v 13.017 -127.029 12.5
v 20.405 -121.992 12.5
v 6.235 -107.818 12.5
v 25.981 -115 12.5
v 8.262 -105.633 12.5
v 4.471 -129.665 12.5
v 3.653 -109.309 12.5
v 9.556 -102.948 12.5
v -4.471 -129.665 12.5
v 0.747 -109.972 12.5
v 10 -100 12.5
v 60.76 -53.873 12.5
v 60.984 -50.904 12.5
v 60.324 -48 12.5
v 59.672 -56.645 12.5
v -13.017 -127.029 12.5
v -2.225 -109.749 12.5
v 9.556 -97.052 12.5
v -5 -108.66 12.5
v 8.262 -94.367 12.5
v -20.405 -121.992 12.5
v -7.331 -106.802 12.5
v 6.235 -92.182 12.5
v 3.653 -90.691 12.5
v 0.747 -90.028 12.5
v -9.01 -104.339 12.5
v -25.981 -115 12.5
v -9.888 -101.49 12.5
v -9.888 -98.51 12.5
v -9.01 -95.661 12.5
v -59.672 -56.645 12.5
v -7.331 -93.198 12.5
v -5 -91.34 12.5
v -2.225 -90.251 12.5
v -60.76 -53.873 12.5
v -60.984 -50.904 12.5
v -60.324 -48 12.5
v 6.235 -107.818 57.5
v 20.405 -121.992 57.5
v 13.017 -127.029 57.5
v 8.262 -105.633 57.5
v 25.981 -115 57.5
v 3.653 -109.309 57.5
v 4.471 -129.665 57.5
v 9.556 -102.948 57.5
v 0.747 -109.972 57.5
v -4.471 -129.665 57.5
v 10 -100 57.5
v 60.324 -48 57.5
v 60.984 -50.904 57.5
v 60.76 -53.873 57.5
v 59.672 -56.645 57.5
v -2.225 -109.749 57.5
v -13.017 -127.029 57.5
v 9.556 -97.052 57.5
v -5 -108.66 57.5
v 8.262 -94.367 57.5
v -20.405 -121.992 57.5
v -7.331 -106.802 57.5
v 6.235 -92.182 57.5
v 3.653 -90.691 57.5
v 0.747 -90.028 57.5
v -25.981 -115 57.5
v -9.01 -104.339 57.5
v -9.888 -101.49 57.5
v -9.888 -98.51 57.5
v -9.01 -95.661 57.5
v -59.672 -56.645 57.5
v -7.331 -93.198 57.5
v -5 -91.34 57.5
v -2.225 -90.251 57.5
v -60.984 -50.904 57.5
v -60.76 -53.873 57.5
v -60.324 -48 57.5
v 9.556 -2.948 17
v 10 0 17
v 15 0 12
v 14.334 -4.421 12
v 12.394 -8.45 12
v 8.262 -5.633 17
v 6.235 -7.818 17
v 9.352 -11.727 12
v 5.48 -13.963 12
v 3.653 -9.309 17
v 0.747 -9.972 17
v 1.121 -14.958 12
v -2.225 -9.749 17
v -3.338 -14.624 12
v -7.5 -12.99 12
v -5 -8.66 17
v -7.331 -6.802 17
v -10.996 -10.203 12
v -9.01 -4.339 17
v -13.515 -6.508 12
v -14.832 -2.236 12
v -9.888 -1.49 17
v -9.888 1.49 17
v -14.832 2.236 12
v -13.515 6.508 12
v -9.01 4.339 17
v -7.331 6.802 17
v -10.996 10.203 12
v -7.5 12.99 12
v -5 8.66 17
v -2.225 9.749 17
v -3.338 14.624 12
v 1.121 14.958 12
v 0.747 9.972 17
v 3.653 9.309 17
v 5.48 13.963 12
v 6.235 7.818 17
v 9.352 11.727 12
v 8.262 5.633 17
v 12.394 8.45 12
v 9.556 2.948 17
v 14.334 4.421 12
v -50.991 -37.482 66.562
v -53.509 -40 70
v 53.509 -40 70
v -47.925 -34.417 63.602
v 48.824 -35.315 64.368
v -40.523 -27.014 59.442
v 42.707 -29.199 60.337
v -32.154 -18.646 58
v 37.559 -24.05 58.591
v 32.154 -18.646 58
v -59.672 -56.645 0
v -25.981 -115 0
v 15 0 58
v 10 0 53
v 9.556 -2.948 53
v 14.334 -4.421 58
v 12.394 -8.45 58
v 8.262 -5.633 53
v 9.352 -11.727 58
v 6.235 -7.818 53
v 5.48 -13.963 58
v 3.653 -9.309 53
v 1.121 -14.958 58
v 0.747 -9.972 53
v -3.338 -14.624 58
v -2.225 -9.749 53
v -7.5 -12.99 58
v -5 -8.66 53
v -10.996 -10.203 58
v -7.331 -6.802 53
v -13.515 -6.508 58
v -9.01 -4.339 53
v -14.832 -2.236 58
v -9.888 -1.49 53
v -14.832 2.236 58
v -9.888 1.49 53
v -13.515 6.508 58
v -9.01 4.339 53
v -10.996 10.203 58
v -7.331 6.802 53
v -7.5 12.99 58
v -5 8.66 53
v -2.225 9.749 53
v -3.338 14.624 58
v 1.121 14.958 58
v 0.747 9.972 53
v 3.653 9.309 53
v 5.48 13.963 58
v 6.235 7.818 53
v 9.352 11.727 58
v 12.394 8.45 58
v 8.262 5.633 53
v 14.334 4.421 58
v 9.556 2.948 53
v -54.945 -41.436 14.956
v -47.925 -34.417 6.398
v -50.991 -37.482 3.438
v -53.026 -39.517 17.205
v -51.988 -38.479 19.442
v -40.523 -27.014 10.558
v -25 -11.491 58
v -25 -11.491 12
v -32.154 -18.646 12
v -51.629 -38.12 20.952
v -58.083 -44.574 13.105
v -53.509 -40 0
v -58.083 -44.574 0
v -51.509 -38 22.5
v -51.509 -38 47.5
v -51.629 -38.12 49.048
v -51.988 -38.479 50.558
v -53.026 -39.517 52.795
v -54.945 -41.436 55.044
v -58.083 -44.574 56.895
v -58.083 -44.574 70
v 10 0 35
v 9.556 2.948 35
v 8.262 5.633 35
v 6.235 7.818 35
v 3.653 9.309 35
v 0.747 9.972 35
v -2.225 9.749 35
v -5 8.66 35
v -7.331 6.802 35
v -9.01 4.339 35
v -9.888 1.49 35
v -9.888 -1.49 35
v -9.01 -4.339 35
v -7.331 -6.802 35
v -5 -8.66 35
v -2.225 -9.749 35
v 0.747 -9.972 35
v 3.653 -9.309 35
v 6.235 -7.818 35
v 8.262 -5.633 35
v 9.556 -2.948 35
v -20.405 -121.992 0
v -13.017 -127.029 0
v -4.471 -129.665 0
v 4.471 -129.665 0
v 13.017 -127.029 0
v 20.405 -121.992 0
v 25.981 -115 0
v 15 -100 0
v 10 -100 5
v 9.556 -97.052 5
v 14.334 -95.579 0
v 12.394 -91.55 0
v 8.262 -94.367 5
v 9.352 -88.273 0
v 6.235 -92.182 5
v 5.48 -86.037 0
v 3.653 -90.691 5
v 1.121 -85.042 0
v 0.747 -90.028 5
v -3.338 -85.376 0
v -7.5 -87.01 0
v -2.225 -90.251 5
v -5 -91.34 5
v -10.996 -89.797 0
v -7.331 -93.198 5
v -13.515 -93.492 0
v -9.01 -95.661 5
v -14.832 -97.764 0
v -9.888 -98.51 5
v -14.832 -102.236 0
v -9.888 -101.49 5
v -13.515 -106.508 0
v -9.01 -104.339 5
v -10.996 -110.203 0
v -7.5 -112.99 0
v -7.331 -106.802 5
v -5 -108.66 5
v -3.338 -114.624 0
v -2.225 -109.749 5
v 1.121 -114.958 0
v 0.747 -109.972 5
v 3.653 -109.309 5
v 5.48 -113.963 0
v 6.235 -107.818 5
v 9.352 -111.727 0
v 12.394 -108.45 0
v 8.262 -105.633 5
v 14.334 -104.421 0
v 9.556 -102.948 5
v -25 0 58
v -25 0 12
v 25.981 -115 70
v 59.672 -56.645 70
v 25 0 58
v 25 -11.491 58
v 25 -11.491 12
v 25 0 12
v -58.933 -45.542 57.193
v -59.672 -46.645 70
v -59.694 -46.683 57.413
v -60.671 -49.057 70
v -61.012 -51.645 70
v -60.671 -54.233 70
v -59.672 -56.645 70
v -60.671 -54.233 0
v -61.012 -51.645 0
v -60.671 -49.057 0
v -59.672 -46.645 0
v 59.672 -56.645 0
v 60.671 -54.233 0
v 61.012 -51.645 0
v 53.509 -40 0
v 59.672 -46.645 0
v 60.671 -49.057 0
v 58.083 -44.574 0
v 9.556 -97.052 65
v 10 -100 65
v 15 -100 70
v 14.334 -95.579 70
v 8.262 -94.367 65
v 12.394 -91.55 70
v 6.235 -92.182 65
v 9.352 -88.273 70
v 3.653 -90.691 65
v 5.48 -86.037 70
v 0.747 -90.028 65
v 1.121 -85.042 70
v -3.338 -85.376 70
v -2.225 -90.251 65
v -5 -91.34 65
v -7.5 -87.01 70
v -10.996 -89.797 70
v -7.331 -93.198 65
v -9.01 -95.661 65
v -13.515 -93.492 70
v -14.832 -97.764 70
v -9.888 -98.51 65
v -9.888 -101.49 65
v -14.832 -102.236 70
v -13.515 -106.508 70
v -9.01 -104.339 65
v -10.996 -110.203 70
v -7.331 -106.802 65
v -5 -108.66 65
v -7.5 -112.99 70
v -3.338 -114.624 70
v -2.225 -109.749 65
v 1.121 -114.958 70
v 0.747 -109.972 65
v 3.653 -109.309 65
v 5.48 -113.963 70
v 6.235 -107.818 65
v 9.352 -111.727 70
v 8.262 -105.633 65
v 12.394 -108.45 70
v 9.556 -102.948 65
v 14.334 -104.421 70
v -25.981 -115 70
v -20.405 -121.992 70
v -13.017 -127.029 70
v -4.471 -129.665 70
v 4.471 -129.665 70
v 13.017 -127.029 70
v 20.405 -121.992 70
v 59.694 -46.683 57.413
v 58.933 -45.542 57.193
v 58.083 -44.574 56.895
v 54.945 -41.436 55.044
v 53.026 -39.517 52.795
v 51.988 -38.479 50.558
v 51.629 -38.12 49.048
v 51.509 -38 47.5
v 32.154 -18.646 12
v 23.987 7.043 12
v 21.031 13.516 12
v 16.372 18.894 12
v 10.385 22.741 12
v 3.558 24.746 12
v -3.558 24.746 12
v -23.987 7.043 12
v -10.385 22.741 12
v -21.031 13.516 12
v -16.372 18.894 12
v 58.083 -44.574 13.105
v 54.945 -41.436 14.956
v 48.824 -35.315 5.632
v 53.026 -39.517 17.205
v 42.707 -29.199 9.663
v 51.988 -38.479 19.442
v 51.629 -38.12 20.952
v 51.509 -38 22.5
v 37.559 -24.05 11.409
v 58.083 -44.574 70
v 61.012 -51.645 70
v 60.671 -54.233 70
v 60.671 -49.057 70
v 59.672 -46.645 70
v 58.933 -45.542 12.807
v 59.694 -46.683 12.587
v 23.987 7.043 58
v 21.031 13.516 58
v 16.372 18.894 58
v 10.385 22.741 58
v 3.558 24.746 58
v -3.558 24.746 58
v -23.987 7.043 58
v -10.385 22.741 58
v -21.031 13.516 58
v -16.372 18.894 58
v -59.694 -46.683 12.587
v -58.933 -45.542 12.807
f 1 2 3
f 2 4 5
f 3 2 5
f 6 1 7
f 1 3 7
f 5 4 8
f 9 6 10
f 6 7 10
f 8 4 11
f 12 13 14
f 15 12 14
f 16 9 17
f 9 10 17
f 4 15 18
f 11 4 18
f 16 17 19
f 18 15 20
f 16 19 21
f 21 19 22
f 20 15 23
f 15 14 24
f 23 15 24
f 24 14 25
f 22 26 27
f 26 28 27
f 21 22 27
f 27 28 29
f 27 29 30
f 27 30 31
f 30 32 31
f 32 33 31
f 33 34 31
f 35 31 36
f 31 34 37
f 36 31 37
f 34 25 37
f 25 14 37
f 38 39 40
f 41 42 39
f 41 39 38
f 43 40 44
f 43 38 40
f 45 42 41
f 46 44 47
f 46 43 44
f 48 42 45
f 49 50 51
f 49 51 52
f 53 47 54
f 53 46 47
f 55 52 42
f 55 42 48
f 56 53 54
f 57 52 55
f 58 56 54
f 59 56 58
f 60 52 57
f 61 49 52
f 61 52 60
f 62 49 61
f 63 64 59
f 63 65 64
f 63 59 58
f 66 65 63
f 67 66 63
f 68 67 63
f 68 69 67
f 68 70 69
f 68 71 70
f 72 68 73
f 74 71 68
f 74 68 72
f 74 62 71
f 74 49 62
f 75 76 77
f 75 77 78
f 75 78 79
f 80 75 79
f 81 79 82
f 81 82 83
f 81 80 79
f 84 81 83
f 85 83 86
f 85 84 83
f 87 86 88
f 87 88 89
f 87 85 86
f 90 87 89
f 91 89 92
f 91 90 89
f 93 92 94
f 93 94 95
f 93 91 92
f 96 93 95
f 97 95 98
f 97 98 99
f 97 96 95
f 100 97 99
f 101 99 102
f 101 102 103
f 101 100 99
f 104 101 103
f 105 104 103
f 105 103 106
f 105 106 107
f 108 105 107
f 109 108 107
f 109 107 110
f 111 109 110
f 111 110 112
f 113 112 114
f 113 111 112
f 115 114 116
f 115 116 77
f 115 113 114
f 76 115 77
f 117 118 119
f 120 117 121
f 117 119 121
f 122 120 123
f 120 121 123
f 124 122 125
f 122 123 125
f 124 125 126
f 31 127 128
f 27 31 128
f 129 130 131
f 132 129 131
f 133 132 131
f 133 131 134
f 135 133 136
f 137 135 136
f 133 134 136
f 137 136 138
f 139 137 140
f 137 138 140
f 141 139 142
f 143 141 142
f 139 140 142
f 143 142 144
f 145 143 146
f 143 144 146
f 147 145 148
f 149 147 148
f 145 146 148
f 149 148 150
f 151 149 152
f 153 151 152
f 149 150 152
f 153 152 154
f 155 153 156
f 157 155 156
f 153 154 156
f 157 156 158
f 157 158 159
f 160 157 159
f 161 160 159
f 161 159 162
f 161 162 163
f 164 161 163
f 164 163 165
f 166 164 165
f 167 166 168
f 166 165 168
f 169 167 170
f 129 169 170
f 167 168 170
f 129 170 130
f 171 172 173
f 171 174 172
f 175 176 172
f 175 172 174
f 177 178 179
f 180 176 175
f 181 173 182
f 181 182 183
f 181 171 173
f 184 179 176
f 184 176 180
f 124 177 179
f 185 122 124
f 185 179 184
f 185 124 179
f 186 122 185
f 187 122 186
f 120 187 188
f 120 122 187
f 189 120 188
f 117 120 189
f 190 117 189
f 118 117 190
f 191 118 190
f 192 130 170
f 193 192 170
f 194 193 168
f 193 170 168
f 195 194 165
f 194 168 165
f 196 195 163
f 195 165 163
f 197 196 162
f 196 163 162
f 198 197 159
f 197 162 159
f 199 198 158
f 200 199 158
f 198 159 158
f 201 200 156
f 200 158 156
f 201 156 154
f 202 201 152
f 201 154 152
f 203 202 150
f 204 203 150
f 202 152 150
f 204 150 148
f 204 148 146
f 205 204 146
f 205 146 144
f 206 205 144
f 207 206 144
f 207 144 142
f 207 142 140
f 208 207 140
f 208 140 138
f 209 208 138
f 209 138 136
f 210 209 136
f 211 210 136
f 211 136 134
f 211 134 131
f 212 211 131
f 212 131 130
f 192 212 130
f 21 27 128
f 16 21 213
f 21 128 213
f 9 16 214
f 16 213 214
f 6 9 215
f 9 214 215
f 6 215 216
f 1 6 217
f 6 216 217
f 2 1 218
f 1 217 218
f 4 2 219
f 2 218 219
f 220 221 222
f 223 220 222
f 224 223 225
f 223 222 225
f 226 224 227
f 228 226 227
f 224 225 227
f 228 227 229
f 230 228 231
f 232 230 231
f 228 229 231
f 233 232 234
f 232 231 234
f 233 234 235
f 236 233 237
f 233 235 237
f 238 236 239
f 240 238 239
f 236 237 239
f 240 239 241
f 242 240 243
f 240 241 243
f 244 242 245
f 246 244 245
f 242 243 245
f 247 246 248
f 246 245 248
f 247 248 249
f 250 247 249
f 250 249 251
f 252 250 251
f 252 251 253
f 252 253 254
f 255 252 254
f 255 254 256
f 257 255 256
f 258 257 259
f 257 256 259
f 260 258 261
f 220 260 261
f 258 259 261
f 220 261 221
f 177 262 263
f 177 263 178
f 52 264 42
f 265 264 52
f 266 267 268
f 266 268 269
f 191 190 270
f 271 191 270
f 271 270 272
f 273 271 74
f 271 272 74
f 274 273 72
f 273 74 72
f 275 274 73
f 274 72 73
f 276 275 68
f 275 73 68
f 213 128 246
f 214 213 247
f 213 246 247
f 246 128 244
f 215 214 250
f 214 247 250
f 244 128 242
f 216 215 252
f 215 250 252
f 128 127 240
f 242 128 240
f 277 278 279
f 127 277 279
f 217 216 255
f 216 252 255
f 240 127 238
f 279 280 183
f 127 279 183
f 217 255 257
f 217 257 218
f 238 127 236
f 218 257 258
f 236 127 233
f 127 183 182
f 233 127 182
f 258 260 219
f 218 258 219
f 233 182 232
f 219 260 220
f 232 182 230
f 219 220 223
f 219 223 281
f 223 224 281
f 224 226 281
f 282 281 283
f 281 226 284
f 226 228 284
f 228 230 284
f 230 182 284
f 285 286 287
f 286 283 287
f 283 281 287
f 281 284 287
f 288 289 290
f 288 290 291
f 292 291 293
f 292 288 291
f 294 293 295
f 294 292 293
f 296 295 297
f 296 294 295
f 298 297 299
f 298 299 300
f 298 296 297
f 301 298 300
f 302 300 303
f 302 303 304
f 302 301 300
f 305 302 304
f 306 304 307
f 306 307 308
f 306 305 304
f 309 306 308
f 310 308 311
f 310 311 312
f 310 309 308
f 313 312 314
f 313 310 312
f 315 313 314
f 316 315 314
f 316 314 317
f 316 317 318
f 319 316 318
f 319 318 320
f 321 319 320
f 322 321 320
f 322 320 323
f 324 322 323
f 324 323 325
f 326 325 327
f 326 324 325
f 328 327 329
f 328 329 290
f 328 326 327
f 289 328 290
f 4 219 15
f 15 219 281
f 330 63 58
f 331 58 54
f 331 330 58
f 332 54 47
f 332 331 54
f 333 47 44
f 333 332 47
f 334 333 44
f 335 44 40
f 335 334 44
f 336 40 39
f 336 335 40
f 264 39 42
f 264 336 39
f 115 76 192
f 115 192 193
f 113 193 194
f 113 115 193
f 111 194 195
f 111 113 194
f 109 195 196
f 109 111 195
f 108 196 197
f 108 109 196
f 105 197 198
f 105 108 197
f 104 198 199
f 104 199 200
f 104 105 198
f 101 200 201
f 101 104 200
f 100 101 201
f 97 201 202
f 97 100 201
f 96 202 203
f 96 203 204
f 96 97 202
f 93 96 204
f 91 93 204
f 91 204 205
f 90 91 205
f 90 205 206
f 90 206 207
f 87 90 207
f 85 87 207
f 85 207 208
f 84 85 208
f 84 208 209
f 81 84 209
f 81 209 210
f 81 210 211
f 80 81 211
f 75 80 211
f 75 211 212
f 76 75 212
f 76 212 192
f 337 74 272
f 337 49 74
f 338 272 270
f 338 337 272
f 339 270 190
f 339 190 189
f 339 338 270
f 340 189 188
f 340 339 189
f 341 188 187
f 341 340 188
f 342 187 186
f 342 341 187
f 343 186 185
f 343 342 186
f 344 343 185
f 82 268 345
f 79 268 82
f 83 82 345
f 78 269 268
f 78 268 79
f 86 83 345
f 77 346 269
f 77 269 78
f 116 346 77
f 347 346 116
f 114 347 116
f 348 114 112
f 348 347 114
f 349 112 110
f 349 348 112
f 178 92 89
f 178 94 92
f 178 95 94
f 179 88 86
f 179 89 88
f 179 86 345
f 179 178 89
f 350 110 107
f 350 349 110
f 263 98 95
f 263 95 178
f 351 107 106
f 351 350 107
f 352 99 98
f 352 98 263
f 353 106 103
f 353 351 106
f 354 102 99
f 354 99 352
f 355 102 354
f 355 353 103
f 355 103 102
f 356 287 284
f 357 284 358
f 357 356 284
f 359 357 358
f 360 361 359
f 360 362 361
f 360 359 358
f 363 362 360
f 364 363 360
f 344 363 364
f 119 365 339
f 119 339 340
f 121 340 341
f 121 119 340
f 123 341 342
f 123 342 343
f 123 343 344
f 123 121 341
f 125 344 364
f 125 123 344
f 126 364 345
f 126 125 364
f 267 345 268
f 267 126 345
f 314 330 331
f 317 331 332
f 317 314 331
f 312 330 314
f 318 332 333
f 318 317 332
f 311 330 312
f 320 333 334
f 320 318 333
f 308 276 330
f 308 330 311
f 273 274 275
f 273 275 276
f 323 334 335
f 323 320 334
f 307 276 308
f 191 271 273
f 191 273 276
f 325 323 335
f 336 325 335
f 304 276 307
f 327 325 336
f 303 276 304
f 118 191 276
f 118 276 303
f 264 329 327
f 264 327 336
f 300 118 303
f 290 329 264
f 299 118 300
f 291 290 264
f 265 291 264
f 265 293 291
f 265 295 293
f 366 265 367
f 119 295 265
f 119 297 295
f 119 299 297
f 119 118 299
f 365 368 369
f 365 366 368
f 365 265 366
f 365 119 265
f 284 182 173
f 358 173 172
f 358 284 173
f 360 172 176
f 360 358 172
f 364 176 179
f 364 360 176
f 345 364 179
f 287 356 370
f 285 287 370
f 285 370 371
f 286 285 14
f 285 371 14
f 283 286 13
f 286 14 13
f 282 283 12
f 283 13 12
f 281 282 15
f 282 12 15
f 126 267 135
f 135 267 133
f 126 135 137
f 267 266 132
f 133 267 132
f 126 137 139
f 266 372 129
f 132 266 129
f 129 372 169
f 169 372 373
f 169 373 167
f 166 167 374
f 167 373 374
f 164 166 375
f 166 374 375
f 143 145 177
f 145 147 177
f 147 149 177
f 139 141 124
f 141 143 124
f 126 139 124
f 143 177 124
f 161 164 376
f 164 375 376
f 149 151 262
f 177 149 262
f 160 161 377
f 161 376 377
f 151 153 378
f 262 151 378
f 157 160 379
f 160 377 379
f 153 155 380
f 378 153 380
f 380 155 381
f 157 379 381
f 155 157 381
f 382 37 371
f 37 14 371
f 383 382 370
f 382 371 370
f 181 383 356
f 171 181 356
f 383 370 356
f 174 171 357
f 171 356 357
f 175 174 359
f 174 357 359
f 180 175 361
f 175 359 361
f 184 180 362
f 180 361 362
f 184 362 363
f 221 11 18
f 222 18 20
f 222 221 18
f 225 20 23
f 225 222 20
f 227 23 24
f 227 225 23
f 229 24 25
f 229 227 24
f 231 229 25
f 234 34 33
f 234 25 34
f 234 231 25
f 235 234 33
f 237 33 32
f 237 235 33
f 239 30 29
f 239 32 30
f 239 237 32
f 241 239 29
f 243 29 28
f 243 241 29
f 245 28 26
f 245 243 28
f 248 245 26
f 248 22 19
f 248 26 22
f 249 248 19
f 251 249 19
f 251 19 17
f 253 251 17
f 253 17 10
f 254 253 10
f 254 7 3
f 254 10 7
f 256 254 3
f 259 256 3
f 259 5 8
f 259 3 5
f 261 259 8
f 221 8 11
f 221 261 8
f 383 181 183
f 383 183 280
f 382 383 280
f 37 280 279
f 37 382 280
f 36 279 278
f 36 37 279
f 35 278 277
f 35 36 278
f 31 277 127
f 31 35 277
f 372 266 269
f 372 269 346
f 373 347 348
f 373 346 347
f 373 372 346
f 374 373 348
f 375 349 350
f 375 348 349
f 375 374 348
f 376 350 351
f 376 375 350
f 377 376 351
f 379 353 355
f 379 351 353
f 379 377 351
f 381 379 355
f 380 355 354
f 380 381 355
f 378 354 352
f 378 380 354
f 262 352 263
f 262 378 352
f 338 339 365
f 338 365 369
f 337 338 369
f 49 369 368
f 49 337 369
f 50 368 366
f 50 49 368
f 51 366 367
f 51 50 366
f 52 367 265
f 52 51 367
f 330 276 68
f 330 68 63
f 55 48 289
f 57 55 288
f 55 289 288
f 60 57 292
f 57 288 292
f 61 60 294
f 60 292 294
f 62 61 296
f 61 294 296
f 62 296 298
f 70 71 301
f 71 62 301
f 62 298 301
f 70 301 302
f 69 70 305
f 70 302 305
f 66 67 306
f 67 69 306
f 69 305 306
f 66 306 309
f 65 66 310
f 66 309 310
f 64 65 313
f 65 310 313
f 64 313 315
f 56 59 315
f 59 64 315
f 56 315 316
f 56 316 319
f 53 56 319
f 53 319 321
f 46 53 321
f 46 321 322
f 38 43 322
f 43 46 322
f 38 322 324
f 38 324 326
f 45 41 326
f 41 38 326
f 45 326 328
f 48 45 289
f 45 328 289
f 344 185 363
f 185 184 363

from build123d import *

# Parameters (mm, degrees)
SKETCH3_R           = 10
BOSS_EXTRUDE4_DEPTH = 35
FILLET3_R           = 10
CUT_EXTRUDE1_DEPTH  = 12
CUT_EXTRUDE2_DEPTH  = 22.5
FILLET4_R           = 25
FILLET5_R           = 10
CHAMFER2_SIZE       = 5
CHAMFER4_SIZE       = 5


with BuildPart() as part:
    # Sketch3 → Boss-Extrude4 (new body)
    with BuildSketch(Plane.XY):
        with BuildLine():
            Line((-25, 0), (-25, -11.491470389))
            Line((-25, -11.491470389), (-63.508529611, -50))
            Line((-63.508529611, -50), (-25.980762114, -115))
            ThreePointArc((-25.980762114, -115), (0, -130), (25.980762114, -115))
            Line((25.980762114, -115), (63.508529611, -50))
            Line((63.508529611, -50), (25, -11.491470389))
            Line((25, -11.491470389), (25, 0))
            ThreePointArc((25, 0), (0, 25), (-25, 0))
        make_face()
        Circle(SKETCH3_R, mode=Mode.SUBTRACT)
        with Locations((0, -100)):
            Circle(SKETCH3_R, mode=Mode.SUBTRACT)
    extrude(amount=BOSS_EXTRUDE4_DEPTH)

    # Fillet3
    fillet3_edges = [part.edges().sort_by_distance(p)[0] for p in [
        (-63.508529611, -50, 17.5),
        (63.508529611, -50, 17.5),
    ]]
    fillet(fillet3_edges, radius=FILLET3_R)

    # Sketch5 → Cut-Extrude1 (cut)
    with BuildSketch(Plane(origin=(0, 0, 0), x_dir=(-1, 0, 0), z_dir=(0, 0, -1))):
        with BuildLine():
            Line((-53.508529611, -40), (53.508529611, -40))
            Line((53.508529611, -40), (25, -11.491470389))
            Line((25, -11.491470389), (25, 0))
            ThreePointArc((25, 0), (0, 25), (-25, 0))
            Line((-25, 0), (-25, -11.491470389))
            Line((-25, -11.491470389), (-53.508529611, -40))
        make_face()
    extrude(amount=-CUT_EXTRUDE1_DEPTH, mode=Mode.SUBTRACT)

    # Sketch6 → Cut-Extrude2 (cut)
    with BuildSketch(Plane.XY.offset(35)):
        with BuildLine():
            Line((-51.508529611, -38), (51.508529611, -38))
            Line((51.508529611, -38), (58.082708445, -44.574178834))
            ThreePointArc((58.082708445, -44.574178834), (60.926089247, -50.339984724), (59.671894671, -56.645246646))
            Line((59.671894671, -56.645246646), (25.980762114, -115))
            ThreePointArc((25.980762114, -115), (0, -130), (-25.980762114, -115))
            Line((-25.980762114, -115), (-59.671894671, -56.645246646))
            ThreePointArc((-59.671894671, -56.645246646), (-60.926089247, -50.339984724), (-58.082708445, -44.574178834))
            Line((-58.082708445, -44.574178834), (-51.508529611, -38))
        make_face()
    extrude(amount=-CUT_EXTRUDE2_DEPTH, mode=Mode.SUBTRACT)

    # Fillet4
    # the kernel refuses this fillet: 25 mm, written as the material it adds along each edge
    with BuildSketch(Plane(origin=(106.893920871, -40, 12), x_dir=(0, 1, 0), z_dir=(-1, 0, 0))) as fillet4_piece_1_section:
        with BuildLine():
            CenterArc((21.354156504, 25), FILLET4_R, 211.332251498, 58.667748502)
            Line((0, 12), (-0.42708313, 11.74))
            ThreePointArc((-0.42708313, 11.74), (-0.5, 6), (-0.5, 0))
            Line((-0.5, 0), (0, -0.5))
            Line((0, -0.5), (21.354156504, -0.5))
            Line((21.354156504, -0.5), (21.354156504, 0))
        make_face()
    fillet4_piece_1 = extrude(amount=213.787841742, mode=Mode.PRIVATE)
    fillet4_piece_1 = split(fillet4_piece_1, bisect_by=Plane(origin=(-24.314247143, -10.805717532, 8.724953467), z_dir=(0.7071067811865464, -0.7071067811865487, 0)), keep=Keep.TOP, mode=Mode.PRIVATE)
    fillet4_piece_1 = split(fillet4_piece_1, bisect_by=Plane(origin=(24.314247143, -10.805717532, 8.724953467), z_dir=(-0.7071067811865461, -0.7071067811865489, 0)), keep=Keep.TOP, mode=Mode.PRIVATE)
    add(fillet4_piece_1)

    # Fillet5
    fillet5_edges = [part.edges().sort_by_distance(p)[0] for p in [
        (0, -38, 12.5),
    ]]
    fillet(fillet5_edges, radius=FILLET5_R)

    # Chamfer2
    chamfer2_edges = [part.edges().sort_by_distance(p)[0] for p in [
        (-10, 0, 12),
    ]]
    chamfer(chamfer2_edges, length=CHAMFER2_SIZE)

    # Mirror2: part across plane


with BuildPart() as part_1:
    add(part.part)
    add(part.part.mirror(Plane(origin=(0, -100, 35), x_dir=(1, 0, 0), z_dir=(0, 0, 1))))

    # Chamfer4
    chamfer4_edges = [part_1.edges().sort_by_distance(p)[0] for p in [
        (-10, -100, 70),
        (-10, -100, 0),
    ]]
    chamfer(chamfer4_edges, length=CHAMFER4_SIZE)


solid = part_1.part
